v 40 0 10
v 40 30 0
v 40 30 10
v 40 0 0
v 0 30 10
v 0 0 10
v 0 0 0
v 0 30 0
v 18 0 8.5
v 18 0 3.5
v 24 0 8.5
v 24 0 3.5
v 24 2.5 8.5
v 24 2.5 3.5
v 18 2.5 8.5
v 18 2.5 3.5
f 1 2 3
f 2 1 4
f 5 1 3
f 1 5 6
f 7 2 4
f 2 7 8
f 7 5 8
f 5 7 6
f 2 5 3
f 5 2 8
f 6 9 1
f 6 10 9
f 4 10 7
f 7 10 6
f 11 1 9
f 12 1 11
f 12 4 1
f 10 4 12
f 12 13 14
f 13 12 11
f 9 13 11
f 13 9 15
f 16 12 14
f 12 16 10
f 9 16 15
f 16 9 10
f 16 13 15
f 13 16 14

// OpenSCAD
// units=mm — generated by scad_emitter.py
// part=unnamed
$fn = 48;

difference() { cube([40, 30, 10]); translate([18, -0.5, 3.5]) cube([6, 3, 5]); }
